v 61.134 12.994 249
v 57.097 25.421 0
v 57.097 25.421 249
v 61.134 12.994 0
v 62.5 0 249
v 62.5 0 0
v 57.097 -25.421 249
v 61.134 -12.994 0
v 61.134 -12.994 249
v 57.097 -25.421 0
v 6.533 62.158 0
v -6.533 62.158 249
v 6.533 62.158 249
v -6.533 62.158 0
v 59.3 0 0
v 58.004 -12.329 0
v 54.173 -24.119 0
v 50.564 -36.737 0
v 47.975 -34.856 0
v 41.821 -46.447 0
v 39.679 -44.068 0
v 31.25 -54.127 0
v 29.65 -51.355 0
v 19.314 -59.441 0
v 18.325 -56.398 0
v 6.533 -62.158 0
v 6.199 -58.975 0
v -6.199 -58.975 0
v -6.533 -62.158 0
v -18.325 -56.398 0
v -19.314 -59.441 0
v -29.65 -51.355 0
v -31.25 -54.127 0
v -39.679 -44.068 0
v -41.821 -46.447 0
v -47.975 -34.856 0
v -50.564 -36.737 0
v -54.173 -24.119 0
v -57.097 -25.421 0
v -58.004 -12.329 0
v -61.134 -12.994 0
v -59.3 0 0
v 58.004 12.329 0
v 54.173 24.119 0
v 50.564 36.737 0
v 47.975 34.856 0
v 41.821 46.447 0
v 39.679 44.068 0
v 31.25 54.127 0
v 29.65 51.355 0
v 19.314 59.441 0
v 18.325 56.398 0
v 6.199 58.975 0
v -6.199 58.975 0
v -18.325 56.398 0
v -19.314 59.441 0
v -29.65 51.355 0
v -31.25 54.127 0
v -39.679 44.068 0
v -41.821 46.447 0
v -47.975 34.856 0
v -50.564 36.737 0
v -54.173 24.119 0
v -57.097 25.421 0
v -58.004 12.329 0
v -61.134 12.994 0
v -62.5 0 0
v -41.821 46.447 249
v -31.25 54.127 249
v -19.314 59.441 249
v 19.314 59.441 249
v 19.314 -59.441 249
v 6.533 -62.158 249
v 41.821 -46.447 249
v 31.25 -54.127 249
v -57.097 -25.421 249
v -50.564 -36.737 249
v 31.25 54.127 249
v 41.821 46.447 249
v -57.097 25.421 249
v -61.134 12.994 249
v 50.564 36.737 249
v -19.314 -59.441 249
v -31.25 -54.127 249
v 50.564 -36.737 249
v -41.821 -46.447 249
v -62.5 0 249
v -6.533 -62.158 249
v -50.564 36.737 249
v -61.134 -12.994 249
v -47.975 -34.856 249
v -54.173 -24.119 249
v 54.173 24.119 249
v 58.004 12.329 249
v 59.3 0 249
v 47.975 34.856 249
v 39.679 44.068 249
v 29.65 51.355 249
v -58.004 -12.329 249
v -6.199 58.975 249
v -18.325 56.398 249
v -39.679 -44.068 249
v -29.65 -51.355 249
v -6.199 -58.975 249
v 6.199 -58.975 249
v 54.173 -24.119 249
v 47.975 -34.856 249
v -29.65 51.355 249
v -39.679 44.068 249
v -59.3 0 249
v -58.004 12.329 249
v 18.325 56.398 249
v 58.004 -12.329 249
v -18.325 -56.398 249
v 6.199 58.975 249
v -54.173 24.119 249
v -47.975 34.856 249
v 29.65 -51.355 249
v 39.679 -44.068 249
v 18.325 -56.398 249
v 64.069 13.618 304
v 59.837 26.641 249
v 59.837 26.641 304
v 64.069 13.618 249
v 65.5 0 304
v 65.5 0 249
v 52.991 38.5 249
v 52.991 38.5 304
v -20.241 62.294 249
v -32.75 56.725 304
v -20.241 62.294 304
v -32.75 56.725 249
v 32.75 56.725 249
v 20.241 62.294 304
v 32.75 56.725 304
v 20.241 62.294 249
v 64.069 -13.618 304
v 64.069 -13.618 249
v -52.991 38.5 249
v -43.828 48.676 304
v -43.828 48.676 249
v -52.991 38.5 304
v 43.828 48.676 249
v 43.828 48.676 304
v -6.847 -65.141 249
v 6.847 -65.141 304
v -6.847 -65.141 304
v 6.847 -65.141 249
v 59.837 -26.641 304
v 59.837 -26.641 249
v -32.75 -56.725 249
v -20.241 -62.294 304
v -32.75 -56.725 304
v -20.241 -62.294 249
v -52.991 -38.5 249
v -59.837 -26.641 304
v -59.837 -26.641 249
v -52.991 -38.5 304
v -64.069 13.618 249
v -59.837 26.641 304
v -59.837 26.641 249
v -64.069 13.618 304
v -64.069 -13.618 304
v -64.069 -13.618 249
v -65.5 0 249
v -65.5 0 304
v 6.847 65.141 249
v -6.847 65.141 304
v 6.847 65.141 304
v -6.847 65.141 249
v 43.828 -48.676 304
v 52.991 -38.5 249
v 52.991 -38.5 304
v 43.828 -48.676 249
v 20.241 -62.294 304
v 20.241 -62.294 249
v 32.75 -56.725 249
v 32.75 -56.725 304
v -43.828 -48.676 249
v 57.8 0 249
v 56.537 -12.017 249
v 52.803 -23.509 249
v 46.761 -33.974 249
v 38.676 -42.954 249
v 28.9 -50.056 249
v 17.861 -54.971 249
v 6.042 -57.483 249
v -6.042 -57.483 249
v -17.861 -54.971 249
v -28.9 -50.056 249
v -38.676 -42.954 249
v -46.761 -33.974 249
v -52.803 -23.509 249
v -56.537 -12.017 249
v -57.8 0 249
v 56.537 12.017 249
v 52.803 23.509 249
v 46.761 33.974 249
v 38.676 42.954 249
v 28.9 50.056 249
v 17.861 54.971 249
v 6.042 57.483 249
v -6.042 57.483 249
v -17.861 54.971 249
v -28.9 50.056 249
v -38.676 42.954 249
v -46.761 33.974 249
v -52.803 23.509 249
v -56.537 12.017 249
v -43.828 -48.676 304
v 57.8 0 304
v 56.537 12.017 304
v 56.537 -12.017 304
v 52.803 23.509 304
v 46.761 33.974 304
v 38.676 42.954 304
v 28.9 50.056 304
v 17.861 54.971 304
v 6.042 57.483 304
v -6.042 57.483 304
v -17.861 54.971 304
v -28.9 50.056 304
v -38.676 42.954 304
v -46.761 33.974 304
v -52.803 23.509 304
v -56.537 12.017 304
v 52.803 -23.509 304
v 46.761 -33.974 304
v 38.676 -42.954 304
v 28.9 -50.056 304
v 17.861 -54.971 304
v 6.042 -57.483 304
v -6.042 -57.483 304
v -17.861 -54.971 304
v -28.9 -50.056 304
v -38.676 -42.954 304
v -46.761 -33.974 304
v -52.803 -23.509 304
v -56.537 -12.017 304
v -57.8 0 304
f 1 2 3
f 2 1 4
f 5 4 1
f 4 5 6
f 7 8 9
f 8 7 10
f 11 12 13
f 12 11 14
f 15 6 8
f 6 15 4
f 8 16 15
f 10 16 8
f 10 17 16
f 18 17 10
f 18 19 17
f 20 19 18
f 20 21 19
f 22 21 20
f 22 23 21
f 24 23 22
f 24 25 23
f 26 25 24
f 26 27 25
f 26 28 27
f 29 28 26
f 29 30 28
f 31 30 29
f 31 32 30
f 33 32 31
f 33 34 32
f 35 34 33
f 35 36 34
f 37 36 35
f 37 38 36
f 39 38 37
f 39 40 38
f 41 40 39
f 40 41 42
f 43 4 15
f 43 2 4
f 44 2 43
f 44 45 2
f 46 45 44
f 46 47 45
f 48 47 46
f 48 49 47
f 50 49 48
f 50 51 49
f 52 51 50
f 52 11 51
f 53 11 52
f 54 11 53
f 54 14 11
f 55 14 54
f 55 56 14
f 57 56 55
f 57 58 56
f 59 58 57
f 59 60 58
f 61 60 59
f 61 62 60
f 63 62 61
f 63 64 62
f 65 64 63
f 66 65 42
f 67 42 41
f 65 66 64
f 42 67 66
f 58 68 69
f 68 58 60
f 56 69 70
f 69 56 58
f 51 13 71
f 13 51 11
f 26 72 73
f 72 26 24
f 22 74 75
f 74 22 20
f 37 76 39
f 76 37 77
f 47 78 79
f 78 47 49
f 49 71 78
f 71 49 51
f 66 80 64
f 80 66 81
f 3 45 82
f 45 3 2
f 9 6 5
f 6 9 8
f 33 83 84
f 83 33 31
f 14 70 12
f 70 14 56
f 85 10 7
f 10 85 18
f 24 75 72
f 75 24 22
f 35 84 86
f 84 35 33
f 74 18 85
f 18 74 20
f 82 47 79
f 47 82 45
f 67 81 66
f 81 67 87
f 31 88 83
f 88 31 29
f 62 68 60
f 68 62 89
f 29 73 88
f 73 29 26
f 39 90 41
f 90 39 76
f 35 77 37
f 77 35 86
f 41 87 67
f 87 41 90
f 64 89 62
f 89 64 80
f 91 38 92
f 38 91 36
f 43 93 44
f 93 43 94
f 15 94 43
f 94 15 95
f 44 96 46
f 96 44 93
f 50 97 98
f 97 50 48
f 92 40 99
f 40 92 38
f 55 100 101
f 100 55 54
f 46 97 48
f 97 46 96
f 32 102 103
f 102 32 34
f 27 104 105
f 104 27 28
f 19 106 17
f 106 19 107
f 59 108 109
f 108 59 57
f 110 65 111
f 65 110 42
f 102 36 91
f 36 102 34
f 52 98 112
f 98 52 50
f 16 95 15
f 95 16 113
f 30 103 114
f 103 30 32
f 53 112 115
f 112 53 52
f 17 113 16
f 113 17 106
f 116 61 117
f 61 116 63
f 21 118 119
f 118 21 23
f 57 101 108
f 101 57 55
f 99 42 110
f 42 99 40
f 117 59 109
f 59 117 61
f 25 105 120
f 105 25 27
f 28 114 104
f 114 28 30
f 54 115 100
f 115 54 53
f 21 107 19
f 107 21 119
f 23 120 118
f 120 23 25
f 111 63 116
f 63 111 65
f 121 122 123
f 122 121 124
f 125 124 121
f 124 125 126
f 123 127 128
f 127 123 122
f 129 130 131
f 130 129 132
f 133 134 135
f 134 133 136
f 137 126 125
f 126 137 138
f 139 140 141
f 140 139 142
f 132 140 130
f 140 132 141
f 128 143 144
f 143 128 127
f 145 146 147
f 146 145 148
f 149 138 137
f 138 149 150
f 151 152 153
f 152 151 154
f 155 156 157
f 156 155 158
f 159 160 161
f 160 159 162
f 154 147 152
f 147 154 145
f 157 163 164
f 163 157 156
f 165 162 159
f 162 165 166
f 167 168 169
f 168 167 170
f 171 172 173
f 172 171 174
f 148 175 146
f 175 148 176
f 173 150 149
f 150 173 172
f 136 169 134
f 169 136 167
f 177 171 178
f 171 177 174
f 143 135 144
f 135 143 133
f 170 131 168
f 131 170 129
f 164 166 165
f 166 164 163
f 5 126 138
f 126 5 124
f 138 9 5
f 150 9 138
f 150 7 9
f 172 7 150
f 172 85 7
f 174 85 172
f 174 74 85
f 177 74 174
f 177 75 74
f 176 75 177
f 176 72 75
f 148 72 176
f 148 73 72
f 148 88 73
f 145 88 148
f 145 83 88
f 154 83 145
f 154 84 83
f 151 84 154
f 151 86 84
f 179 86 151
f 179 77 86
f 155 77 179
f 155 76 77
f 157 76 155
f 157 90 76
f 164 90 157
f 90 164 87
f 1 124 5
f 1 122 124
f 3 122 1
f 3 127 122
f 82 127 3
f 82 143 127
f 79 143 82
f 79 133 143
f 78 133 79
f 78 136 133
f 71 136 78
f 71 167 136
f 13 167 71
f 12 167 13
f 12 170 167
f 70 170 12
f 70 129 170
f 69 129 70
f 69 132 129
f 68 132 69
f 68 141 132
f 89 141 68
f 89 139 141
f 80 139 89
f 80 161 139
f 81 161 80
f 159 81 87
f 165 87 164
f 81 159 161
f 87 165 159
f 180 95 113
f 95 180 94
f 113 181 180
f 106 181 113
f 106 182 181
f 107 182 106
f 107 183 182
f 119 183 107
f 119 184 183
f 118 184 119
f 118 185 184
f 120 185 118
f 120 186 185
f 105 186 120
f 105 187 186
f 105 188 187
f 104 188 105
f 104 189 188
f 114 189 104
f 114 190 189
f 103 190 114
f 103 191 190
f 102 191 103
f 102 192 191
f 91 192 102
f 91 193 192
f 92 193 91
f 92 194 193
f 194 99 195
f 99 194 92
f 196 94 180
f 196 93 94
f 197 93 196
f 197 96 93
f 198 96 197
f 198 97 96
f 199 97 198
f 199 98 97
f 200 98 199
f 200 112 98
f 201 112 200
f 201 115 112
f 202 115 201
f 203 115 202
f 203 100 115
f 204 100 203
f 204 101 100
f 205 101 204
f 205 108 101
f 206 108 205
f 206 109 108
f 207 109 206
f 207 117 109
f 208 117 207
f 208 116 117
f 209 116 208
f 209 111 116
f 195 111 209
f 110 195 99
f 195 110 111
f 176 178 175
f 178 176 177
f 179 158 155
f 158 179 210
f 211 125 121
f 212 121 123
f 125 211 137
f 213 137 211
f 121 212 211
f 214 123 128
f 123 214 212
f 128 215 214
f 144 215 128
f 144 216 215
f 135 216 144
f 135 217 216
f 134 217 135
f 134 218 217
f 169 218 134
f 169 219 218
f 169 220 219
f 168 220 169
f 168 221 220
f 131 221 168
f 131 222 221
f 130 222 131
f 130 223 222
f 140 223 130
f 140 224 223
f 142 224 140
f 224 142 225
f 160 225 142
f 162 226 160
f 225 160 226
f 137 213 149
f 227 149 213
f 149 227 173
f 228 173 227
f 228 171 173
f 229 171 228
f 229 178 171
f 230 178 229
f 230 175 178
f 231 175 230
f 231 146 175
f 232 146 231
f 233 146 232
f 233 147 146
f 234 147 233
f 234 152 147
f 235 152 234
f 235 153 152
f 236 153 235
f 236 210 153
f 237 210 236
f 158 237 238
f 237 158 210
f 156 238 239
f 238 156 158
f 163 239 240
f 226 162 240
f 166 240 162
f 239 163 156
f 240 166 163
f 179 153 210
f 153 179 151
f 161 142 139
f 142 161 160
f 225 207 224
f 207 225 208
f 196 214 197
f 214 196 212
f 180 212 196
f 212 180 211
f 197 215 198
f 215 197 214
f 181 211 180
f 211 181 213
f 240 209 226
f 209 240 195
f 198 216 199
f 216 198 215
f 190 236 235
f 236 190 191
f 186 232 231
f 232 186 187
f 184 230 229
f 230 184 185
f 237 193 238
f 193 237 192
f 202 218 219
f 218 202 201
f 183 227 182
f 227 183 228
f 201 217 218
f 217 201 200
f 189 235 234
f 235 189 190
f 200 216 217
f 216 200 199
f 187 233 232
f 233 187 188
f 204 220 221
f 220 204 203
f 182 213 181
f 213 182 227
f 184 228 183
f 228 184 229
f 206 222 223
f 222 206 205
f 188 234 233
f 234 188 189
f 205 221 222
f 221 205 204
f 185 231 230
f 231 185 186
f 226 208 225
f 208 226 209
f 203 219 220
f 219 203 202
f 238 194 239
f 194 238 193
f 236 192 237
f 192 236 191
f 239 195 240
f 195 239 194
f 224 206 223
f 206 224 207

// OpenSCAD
// Parameters
pipe_standard = 1; //[1:1:1]
nominal_diameter_mm = 125; //[63:250:1]
length_mm = 250; //[100:600:1]
include_end_fitting = 1; //[0:1:1]
od_mm = 125; //[63:250:1]
wall_mm = 3.2; //[1.6:6.4:0.1]
fit_len_mm = 55; //[25:110:1]
fit_od_extra_mm = 6; //[2:15:0.5]
fit_wall_extra_mm = 1.5; //[0.5:4:0.1]
overlap_mm = 1; //[0.5:2:0.1]

// HT Pipe - complete geometry
module ht_pipe() {
  color([0.85, 0.85, 0.8]) {
    // Main pipe
    difference() {
      cylinder(h=length_mm, r=od_mm/2, center=false);
      translate([0, 0, -overlap_mm/2])
        cylinder(h=length_mm + overlap_mm, r=od_mm/2 - wall_mm, center=false);
    }
    
    // End fitting
    if (include_end_fitting) {
      difference() {
        translate([0, 0, length_mm - overlap_mm])
          cylinder(h=fit_len_mm, r=od_mm/2 + fit_od_extra_mm/2, center=false);
        translate([0, 0, length_mm - overlap_mm - overlap_mm/2])
          cylinder(h=fit_len_mm + overlap_mm, r=od_mm/2 - wall_mm - fit_wall_extra_mm, center=false);
      }
    }
  }
}

// Assembly
module assembly() {
  ht_pipe();
}

assembly();
